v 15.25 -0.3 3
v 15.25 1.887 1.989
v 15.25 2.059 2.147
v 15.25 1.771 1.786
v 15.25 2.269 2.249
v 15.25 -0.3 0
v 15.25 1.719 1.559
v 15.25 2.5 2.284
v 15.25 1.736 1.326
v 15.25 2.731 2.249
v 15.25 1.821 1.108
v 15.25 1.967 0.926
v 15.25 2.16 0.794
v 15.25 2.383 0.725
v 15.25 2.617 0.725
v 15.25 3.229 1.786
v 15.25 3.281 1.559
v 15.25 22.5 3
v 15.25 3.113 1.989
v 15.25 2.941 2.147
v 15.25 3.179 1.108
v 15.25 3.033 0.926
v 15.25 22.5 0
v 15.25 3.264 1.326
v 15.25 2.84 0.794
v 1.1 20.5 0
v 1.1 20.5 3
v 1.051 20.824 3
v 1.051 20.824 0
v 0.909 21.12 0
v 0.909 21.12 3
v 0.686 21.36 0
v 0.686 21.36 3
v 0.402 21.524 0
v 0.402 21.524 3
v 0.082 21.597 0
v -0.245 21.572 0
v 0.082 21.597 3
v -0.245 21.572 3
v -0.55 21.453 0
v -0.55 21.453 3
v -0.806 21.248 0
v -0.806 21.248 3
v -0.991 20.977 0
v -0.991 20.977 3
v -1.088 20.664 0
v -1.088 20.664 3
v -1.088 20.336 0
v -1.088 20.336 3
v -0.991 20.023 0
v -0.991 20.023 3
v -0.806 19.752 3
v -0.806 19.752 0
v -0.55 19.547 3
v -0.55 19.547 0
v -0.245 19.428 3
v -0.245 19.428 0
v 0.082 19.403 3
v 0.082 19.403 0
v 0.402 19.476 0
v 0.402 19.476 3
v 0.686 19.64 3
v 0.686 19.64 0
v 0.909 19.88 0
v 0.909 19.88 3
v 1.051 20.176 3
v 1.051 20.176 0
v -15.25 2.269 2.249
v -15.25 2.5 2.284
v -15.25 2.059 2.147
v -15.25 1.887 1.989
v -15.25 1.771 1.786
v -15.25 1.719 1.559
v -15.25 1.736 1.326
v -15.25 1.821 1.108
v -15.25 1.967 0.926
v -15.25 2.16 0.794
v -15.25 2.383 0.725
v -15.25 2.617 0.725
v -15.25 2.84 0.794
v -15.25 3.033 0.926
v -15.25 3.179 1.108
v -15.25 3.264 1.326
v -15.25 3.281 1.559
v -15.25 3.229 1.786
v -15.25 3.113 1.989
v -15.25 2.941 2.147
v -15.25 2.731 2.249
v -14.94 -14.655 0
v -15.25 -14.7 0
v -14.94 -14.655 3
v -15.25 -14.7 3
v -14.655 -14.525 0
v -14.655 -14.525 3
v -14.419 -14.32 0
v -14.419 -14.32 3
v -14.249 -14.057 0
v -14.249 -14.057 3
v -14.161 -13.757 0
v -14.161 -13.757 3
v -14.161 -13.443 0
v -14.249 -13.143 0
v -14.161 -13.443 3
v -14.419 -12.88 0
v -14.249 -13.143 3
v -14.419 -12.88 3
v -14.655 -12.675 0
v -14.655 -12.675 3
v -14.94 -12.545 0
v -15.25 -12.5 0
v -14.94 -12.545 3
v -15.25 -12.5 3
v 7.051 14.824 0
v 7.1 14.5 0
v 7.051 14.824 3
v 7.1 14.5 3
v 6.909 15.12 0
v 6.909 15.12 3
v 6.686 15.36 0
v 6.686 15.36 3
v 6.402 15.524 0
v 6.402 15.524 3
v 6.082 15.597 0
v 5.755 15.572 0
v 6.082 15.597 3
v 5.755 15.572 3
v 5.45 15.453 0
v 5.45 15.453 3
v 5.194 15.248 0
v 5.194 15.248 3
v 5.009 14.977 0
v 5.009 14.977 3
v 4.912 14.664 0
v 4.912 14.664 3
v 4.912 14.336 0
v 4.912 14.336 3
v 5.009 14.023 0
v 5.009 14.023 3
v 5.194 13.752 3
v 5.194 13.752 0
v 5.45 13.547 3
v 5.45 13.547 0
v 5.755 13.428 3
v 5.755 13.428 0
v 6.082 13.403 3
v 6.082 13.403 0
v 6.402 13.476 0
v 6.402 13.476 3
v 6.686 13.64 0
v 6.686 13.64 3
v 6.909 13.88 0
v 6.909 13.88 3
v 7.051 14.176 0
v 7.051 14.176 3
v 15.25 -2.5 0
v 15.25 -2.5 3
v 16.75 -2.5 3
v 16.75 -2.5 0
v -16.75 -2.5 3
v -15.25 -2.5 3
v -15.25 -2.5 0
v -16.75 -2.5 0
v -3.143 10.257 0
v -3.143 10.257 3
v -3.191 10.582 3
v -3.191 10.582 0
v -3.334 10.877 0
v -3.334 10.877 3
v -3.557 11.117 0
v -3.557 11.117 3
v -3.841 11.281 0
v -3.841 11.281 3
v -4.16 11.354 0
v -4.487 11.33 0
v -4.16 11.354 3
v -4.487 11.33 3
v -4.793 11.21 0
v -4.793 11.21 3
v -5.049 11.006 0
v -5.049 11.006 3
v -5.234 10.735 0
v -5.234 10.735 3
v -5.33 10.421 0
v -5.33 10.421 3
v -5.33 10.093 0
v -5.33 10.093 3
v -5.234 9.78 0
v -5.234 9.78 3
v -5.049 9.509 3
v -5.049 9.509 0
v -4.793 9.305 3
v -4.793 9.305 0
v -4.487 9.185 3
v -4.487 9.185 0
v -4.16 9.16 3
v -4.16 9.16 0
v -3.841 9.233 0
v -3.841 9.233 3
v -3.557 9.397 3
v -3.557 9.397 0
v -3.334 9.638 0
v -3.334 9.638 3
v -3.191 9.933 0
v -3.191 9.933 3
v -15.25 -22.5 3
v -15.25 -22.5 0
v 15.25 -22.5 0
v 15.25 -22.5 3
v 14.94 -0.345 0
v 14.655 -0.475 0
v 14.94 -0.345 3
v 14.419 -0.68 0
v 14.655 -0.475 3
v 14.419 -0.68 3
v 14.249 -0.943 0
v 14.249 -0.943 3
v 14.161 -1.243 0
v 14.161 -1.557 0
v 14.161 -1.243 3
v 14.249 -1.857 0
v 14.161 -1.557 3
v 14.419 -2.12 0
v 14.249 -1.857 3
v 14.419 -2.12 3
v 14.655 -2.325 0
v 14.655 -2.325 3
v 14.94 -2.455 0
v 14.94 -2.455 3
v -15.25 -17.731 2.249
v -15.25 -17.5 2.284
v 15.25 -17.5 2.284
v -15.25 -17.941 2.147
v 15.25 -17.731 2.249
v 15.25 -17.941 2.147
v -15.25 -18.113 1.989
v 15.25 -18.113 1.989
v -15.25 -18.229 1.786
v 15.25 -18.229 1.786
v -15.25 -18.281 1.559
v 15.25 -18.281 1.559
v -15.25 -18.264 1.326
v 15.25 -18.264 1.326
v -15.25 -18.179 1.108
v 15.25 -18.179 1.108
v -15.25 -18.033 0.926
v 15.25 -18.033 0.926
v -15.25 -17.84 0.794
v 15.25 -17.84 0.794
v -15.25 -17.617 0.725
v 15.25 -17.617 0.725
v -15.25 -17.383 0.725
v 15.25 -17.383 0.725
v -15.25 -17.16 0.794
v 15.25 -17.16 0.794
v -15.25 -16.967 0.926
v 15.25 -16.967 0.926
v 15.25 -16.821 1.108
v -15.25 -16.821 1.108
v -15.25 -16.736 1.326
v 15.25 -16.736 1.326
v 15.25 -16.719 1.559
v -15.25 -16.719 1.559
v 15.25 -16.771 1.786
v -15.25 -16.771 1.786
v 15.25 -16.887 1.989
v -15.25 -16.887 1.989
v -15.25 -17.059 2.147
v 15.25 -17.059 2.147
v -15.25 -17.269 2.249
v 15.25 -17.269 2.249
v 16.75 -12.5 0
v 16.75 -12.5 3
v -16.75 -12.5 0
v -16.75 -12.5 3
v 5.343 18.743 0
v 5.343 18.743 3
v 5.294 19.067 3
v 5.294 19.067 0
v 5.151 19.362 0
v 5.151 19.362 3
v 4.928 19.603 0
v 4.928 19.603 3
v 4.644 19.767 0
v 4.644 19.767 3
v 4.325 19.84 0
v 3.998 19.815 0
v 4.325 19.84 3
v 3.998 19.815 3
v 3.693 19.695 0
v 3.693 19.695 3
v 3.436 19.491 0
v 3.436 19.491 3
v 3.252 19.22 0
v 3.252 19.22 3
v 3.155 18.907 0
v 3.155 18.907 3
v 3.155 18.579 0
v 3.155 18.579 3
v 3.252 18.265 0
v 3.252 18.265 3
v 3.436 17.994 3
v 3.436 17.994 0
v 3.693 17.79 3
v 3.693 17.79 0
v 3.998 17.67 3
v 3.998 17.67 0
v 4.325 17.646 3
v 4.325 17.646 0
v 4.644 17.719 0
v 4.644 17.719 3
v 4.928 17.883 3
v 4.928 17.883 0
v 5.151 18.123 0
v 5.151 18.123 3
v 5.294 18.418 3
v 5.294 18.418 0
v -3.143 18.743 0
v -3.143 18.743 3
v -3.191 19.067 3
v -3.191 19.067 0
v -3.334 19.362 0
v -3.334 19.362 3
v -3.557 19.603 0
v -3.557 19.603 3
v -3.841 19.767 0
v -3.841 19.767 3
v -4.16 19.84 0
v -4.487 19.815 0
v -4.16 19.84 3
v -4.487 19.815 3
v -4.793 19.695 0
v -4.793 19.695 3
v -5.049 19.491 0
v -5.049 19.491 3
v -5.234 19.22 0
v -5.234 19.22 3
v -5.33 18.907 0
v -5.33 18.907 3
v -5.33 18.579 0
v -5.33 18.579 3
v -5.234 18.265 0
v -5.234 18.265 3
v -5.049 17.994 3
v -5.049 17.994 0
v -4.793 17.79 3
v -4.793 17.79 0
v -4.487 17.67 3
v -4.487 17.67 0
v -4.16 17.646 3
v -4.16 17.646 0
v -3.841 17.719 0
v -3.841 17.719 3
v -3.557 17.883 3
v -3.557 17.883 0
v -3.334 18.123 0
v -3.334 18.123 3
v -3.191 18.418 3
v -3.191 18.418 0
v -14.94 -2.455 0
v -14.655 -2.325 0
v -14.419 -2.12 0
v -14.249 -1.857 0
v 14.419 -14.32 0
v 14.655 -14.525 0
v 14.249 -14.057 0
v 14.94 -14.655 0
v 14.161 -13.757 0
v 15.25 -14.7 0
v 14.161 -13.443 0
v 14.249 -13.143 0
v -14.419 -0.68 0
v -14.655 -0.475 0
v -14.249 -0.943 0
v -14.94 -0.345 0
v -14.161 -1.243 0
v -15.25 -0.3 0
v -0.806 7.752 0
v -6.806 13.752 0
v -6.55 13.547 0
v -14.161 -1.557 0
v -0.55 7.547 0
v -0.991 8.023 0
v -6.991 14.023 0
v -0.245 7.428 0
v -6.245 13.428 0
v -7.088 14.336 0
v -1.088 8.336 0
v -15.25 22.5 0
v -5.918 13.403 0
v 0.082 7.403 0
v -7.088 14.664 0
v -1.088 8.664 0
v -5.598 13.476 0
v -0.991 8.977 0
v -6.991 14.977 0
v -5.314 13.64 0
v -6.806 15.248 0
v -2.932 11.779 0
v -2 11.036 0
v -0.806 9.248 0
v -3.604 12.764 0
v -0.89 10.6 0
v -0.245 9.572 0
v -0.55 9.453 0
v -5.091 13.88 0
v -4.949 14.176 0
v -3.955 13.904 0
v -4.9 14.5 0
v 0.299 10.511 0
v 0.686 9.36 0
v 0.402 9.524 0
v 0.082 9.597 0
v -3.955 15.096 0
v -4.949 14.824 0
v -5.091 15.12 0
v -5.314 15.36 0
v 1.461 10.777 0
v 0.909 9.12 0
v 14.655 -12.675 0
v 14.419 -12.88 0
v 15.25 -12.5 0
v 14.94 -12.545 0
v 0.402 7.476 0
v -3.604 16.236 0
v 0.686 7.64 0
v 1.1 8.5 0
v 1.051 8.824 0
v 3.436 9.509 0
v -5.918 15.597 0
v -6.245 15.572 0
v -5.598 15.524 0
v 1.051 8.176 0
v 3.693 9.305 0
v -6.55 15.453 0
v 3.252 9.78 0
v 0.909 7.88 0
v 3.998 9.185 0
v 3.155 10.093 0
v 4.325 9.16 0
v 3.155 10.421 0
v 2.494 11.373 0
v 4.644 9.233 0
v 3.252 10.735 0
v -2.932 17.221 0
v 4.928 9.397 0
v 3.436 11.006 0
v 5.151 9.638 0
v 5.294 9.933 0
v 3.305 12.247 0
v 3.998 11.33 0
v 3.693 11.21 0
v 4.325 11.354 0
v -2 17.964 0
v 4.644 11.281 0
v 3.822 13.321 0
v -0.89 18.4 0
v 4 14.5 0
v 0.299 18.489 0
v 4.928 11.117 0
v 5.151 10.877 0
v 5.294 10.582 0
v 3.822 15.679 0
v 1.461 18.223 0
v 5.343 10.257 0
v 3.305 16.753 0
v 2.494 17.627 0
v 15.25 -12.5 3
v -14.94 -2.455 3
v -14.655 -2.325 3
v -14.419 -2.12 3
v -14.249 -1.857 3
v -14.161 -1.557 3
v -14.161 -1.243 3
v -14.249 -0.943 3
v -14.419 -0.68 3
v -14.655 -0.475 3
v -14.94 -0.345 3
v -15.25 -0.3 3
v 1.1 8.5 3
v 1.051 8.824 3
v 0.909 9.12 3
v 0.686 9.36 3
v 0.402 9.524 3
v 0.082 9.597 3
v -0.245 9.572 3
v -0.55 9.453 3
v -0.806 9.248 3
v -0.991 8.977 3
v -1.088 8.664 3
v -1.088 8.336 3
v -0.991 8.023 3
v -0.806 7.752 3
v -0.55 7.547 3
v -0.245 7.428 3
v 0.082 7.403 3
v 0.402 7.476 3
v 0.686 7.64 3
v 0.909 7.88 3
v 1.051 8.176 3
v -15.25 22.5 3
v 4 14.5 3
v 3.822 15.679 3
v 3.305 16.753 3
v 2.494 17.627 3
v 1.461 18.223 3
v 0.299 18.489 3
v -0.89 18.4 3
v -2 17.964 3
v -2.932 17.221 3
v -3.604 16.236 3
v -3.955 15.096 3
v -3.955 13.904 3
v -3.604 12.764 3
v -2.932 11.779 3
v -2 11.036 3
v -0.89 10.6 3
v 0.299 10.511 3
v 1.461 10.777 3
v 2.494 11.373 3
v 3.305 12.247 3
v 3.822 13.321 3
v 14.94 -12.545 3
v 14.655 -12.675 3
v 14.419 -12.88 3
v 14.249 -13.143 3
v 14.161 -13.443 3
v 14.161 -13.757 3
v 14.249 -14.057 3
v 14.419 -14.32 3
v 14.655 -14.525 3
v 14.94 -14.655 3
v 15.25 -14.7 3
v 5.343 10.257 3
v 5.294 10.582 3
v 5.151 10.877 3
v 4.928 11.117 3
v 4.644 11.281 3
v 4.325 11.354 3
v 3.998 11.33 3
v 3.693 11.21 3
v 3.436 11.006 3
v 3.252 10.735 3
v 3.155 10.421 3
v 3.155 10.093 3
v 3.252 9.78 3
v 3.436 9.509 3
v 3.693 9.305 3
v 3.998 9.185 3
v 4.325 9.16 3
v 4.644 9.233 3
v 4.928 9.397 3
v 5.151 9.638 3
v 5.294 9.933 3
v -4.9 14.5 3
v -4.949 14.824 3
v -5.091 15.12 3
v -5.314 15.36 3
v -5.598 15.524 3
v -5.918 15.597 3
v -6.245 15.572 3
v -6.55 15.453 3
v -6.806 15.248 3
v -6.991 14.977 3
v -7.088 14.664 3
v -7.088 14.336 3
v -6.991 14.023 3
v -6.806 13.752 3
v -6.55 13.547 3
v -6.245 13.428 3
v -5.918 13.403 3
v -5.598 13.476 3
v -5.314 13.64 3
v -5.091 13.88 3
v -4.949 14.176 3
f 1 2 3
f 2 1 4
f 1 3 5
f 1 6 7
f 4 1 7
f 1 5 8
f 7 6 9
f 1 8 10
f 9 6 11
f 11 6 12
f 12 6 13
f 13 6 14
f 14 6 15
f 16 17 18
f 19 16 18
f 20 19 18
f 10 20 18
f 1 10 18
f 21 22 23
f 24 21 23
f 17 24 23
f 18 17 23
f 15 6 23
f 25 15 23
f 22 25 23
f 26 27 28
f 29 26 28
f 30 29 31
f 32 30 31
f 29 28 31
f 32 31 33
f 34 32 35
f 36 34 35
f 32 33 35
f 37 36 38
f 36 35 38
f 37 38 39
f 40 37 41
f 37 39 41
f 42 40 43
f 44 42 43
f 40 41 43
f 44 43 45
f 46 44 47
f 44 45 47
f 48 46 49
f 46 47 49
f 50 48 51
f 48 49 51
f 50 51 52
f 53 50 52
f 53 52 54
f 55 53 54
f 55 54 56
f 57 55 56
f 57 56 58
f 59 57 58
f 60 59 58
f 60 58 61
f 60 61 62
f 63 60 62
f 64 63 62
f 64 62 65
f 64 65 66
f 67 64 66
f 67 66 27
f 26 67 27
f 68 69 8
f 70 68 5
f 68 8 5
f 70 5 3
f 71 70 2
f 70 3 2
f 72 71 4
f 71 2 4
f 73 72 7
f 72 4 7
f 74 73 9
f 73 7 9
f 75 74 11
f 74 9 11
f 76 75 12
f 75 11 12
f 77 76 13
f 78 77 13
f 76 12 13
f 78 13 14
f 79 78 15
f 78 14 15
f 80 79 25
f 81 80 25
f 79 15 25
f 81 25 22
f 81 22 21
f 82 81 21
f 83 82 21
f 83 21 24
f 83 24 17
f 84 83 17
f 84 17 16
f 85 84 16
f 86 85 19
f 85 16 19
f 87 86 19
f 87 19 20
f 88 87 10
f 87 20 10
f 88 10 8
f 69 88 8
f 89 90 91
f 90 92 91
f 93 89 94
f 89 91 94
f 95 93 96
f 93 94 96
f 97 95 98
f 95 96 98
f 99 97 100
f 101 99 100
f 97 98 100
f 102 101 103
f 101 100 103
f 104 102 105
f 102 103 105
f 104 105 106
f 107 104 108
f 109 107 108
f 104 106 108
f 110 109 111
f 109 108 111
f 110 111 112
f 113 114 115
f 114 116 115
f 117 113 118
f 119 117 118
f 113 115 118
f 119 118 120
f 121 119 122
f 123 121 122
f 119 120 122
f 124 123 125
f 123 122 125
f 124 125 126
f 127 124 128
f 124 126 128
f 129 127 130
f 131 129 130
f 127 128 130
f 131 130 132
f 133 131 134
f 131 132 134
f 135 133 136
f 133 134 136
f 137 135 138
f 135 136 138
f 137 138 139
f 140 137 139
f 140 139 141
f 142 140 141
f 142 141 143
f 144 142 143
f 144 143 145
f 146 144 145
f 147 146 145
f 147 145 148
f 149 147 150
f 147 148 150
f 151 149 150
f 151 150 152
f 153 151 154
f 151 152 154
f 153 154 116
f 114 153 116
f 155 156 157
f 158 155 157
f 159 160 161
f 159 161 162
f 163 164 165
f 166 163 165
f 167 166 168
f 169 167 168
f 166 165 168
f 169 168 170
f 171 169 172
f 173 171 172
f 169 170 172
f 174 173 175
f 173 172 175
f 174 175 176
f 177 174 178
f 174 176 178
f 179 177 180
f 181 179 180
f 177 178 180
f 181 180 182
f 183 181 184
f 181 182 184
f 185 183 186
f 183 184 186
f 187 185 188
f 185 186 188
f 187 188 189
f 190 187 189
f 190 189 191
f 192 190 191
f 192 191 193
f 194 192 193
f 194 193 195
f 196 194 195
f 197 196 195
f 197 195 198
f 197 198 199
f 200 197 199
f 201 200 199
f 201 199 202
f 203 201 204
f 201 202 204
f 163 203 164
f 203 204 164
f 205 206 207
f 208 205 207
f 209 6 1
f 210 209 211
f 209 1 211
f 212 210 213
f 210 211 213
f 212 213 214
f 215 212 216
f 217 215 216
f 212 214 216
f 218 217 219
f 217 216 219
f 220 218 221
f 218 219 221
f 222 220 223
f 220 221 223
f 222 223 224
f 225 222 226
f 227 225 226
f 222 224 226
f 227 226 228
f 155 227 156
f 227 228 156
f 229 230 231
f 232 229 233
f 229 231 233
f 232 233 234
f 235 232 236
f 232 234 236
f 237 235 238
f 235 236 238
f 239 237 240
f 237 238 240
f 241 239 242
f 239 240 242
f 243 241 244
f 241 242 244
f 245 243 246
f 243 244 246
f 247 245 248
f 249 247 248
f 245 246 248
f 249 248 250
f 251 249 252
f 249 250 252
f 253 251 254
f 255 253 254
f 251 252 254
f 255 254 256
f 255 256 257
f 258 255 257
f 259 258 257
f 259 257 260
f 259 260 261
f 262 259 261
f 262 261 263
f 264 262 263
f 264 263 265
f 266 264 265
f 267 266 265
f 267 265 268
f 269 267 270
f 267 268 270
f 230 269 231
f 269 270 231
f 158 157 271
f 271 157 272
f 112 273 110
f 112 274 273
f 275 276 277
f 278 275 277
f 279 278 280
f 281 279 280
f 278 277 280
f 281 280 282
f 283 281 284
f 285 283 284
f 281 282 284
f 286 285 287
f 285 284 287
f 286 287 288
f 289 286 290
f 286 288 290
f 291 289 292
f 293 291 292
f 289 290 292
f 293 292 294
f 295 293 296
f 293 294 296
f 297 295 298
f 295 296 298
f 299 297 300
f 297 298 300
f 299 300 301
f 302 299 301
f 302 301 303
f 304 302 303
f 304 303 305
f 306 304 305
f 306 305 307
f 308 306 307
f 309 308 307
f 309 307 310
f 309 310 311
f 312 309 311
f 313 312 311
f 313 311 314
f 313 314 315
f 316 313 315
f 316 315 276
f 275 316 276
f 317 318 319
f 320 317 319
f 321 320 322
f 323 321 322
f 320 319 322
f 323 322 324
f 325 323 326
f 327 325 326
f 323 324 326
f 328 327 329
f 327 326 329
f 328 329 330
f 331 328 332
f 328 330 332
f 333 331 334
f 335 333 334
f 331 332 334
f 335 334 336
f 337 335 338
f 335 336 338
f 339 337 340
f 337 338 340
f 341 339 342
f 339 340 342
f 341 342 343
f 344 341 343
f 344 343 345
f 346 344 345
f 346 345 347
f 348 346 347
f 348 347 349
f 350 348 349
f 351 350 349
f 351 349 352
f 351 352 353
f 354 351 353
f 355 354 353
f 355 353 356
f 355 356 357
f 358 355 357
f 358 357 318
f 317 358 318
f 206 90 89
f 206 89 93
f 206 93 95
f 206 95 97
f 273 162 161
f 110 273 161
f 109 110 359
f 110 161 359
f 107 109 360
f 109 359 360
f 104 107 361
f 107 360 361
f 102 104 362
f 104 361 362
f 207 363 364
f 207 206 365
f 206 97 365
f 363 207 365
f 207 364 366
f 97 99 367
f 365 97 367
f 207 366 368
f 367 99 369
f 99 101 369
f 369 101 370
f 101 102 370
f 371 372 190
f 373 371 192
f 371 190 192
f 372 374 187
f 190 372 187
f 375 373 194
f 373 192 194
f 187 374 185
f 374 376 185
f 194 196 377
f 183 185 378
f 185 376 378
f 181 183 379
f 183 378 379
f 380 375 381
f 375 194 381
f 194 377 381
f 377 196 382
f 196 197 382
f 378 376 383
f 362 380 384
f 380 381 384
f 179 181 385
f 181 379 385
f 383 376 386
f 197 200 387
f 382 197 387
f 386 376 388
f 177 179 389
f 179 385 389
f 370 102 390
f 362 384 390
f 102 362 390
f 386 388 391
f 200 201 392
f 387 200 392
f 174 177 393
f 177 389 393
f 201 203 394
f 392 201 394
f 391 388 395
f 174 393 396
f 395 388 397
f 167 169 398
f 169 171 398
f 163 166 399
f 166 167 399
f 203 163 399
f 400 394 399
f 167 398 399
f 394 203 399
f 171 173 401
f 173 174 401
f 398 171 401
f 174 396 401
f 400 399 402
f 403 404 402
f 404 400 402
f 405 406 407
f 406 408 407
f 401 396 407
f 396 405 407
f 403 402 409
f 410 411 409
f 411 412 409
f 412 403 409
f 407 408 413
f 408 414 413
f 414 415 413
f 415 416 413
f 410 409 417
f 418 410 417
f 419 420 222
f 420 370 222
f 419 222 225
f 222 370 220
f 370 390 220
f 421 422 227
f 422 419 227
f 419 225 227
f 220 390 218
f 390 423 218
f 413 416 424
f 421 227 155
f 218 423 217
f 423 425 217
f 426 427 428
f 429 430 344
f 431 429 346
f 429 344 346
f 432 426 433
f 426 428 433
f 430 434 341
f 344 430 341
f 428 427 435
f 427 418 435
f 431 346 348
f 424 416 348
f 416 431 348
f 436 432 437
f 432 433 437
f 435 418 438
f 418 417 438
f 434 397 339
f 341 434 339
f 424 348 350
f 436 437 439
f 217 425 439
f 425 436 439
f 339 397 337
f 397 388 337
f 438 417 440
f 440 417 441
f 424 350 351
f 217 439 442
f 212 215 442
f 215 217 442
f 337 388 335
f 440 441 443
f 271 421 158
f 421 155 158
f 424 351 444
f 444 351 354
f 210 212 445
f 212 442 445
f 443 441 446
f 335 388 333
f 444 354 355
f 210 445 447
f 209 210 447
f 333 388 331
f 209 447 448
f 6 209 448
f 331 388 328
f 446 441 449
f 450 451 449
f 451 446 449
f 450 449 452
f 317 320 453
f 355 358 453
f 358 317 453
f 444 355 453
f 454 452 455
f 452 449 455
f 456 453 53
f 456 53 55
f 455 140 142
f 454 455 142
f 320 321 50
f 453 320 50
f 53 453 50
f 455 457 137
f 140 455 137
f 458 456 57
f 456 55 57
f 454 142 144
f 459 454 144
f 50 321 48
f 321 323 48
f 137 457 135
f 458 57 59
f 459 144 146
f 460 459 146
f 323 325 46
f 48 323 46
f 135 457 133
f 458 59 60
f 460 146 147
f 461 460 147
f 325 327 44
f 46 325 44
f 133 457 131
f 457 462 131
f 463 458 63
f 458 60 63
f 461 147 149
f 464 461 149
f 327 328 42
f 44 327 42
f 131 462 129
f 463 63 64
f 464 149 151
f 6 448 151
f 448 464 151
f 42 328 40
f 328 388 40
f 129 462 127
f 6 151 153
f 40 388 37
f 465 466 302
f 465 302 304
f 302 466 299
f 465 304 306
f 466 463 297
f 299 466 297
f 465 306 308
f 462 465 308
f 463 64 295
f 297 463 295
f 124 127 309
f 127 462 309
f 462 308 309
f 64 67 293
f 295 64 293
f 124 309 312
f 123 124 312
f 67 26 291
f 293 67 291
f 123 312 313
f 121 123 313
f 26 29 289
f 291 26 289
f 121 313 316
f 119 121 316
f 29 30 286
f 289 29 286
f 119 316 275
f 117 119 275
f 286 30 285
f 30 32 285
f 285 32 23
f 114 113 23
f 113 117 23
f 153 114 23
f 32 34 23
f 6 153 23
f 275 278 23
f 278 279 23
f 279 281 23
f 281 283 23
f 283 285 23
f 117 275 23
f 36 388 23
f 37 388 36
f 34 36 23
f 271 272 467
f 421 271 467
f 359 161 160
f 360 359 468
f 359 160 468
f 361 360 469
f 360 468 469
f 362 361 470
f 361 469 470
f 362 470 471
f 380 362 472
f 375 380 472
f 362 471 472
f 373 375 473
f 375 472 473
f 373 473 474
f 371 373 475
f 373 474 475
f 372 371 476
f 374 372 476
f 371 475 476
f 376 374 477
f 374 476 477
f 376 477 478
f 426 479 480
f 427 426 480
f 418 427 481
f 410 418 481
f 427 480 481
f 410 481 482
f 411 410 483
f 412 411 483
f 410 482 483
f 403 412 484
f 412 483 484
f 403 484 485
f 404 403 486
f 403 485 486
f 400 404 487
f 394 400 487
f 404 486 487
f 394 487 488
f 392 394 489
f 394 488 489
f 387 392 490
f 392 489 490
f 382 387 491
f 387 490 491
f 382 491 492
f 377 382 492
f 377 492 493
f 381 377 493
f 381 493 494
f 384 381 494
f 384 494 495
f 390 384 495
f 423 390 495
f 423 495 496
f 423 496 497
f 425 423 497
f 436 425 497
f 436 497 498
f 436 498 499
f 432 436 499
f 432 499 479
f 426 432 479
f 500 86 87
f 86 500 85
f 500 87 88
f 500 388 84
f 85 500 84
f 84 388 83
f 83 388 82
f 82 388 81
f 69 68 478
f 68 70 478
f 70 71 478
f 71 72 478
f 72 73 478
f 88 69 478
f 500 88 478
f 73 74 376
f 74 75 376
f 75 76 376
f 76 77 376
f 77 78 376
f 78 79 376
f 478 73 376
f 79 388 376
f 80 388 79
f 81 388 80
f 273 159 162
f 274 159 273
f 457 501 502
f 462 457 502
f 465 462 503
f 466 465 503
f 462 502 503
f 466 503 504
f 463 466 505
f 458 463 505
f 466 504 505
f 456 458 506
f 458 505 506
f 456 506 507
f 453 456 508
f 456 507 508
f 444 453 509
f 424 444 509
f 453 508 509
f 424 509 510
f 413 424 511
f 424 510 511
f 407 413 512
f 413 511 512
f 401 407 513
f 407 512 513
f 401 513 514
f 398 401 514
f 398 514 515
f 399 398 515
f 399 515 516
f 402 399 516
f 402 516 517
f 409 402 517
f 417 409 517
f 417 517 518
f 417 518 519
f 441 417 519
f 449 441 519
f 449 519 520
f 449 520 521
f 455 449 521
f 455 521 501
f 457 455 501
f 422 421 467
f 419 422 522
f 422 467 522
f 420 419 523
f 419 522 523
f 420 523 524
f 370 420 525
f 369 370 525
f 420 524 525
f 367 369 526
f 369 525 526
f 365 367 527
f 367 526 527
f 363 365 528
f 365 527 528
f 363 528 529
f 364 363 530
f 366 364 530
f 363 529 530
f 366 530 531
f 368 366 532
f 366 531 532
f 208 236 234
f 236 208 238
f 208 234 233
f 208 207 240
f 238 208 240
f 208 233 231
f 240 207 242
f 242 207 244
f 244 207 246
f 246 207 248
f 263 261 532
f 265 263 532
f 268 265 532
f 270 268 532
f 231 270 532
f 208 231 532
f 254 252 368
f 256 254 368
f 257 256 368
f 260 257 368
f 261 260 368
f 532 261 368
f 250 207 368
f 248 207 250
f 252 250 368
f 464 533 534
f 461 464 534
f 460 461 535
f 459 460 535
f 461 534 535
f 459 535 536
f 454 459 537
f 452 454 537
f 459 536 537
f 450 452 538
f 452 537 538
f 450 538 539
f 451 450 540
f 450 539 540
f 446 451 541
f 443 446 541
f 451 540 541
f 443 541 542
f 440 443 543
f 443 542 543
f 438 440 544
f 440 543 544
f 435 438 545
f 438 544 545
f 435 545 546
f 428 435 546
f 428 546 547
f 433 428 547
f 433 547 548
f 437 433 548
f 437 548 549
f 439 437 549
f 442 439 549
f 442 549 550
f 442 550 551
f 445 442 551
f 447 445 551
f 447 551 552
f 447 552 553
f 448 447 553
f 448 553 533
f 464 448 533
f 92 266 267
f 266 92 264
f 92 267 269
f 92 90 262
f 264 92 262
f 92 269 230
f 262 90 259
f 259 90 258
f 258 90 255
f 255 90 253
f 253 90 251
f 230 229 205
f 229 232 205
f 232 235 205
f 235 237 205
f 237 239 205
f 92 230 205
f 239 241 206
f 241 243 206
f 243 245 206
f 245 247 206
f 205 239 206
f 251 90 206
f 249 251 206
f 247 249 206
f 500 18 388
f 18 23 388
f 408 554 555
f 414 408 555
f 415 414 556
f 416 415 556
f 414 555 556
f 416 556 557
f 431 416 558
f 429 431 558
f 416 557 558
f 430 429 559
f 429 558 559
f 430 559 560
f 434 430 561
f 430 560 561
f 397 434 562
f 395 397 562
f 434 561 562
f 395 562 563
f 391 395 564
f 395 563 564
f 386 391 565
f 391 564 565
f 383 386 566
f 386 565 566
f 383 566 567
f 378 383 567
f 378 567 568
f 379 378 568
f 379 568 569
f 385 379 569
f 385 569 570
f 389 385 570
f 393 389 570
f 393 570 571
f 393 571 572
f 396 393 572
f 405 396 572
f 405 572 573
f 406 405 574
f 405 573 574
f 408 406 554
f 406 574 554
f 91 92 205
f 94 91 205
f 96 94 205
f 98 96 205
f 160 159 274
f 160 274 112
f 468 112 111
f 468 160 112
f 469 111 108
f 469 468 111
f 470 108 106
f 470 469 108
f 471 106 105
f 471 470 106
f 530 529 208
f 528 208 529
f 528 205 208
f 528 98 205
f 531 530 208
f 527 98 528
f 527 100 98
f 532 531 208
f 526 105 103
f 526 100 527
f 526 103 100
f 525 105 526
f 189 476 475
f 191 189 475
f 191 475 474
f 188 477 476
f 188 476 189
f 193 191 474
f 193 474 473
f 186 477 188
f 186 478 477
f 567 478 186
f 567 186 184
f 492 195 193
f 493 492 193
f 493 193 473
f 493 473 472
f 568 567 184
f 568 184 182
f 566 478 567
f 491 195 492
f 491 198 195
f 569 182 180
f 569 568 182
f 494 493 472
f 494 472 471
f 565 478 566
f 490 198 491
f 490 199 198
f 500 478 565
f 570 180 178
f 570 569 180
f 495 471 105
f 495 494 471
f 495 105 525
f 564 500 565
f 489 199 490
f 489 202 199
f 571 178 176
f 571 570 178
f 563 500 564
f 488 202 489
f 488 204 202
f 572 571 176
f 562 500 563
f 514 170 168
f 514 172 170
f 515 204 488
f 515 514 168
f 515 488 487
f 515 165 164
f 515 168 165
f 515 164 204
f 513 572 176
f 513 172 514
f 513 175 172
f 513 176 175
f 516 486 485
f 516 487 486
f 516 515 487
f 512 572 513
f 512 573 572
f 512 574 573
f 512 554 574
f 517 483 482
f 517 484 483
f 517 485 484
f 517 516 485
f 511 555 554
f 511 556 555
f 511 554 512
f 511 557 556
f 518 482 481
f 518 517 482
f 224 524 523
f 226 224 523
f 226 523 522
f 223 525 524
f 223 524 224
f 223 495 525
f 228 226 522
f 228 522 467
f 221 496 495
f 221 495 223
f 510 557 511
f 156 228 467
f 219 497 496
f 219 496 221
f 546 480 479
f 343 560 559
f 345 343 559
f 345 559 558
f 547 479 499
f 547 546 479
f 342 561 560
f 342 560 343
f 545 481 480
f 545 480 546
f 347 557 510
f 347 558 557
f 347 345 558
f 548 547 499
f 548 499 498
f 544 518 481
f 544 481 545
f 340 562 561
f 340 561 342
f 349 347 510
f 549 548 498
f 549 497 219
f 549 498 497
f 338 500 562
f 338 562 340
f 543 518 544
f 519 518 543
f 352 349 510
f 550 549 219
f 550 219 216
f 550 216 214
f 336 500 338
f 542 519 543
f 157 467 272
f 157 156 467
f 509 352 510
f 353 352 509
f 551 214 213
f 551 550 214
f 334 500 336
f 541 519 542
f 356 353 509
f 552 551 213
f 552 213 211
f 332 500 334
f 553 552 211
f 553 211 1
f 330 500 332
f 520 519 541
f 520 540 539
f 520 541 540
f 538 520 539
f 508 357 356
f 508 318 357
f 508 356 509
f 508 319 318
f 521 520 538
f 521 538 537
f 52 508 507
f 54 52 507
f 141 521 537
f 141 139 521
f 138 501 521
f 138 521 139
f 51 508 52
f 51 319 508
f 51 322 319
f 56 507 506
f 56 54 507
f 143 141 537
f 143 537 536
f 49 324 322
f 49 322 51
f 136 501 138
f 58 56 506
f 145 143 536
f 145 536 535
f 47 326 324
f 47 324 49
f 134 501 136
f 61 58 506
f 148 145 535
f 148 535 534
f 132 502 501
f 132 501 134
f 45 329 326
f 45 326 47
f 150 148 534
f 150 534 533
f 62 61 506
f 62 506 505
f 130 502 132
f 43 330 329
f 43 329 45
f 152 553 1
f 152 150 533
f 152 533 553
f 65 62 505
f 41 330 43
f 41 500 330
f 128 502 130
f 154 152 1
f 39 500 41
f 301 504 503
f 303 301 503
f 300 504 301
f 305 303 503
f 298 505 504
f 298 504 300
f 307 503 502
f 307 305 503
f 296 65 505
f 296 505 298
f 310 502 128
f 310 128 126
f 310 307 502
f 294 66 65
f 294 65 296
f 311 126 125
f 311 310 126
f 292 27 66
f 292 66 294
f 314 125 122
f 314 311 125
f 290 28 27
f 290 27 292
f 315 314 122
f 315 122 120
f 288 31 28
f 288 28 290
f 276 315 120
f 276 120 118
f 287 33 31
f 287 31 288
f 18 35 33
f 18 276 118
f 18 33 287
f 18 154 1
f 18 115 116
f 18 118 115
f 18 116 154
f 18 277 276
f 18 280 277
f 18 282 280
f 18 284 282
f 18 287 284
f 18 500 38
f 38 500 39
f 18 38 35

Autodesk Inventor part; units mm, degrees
ref_plane "YZ Plane" through (0, 0, 0) normal (1, 0, 0) x (0, 1, 0)
ref_plane "XZ Plane" through (0, 0, 0) normal (0, 1, 0) x (-1, 0, 0)
ref_plane "XY Plane" through (0, 0, 0) normal (0, 0, 1) x (1, 0, 0)
sketch "スケッチ1" plane through (0, 0, 0) normal (0, 0, 1) x (1, 0, 0)
  line L0 (-15.25, -22.5) -> (15.25, -22.5)
  line L1 (15.25, -22.5) -> (15.25, 22.5)
  line L2 (15.25, 22.5) -> (-15.25, 22.5)
  line L3 (-15.25, 22.5) -> (-15.25, -22.5)
  line L4 (-15.25, -22.5) -> (15.25, 22.5) construction
  line L5 (15.25, -22.5) -> (-15.25, 22.5) construction
  point P0 (0, 0)
  dimension "d0" = 30.5
  dimension "d1" = 45
extrude "押し出し1" add sketch "スケッチ1" along normal blind 3
sketch "スケッチ2" plane through (0, 0, 3) normal (0, 0, 1) x (1, 0, 0)
  line L0 (-15.25, -2.5) -> (-16.75, -2.5)
  line L1 (-16.75, -2.5) -> (-16.75, -12.5)
  line L2 (-16.75, -12.5) -> (-15.25, -12.5)
  line L3 (-15.25, -12.5) -> (-15.25, -2.5)
  line L4 (-15.25, 22.5) -> (-15.25, -22.5) projected
  line L5 (-15.25, -22.5) -> (15.25, -22.5) projected
  circle A0 centre (-15.25, -13.6) radius 1.1
  circle A1 centre (-15.25, -1.4) radius 1.1
  line L6 (15.25, 22.5) -> (-15.25, 22.5) construction
  line L7 (0, 22.5) -> (0, 0) construction
  line L8 (15.25, -2.5) -> (16.75, -2.5)
  line L9 (16.75, -2.5) -> (16.75, -12.5)
  line L10 (16.75, -12.5) -> (15.25, -12.5)
  line L11 (15.25, -12.5) -> (15.25, -2.5)
  circle A2 centre (15.25, -13.6) radius 1.1
  circle A3 centre (15.25, -1.4) radius 1.1
  point P0 (-15.25, -0.3)
  point P1 (-15.25, -14.7)
  dimension "d7" = 2.2
  dimension "d4" = 10
  dimension "d5" = 1.5
  dimension "d6" = 10
extrude "押し出し2" add sketch "スケッチ2" against normal up to surface (3 mm away) contours L3 L2 L1 L0 | L8 L9 L10 L11
extrude "押し出し3" cut sketch "スケッチ2" against normal through all contours A0 L4 | L4 A1 | A2 | A3 picked at (-14.7226, -13.8557) picked at (-14.9196, -1.2409)
sketch "スケッチ3" plane through (-15.25, 22.5, 0) normal (-1, 0, 0) x (0, 0, 1)
  line L0 (3, -25) -> (0, -25) projected
  line L1 (3, -35) -> (0, -35) projected
  point P0 (0, -22.5)
  point P1 (1.5, -20)
  point P2 (1.5, -40)
  point P3 (1.5, -25)
  point P4 (1.5, -35)
  point P5 (1.5, -25)
  point P6 (1.5, -35)
  dimension "d12" = 5
  dimension "d13" = 5
hole "穴1" at (-15.25, 2.5, 1.5) at (-15.25, -17.5, 1.5) direction (1, 0, 0) diameter 1.567 end through all thread size "M2x0.4" class "6H" standard "ISO Metric profile"
sketch "スケッチ4" plane through (0, 0, 3) normal (0, 0, 1) x (1, 0, 0)
  circle A0 centre (0, 14.5) radius 8
  line L0 (15.25, 22.5) -> (-15.25, 22.5) projected
  circle A1 centre (0, 14.5) radius 4
  circle A2 centre (0, 14.5) radius 6 construction
  circle A3 centre (0, 8.5) radius 1.1
  circle A4 centre (4.2426, 10.2574) radius 1.1
  circle A5 centre (6, 14.5) radius 1.1
  circle A6 centre (4.2426, 18.7426) radius 1.1
  circle A7 centre (0, 20.5) radius 1.1
  circle A8 centre (-4.2426, 18.7426) radius 1.1
  circle A9 centre (-6, 14.5) radius 1.1
  circle A10 centre (-4.2426, 10.2574) radius 1.1
  point P0 (0, 0)
  point P1 (0, 22.5)
  dimension "d23" = 12
  dimension "d21" = 16
  dimension "d22" = 8
  dimension "d24" = 2.2
  dimension "d27" = 360
extrude "押し出し4" cut sketch "スケッチ4" against normal through all contours A1 | A3 | A4 | A5 | A6 | A7 | A8 | A9 | A10
equation "\"d13\" = d12"
properties part number "kosiyo"
